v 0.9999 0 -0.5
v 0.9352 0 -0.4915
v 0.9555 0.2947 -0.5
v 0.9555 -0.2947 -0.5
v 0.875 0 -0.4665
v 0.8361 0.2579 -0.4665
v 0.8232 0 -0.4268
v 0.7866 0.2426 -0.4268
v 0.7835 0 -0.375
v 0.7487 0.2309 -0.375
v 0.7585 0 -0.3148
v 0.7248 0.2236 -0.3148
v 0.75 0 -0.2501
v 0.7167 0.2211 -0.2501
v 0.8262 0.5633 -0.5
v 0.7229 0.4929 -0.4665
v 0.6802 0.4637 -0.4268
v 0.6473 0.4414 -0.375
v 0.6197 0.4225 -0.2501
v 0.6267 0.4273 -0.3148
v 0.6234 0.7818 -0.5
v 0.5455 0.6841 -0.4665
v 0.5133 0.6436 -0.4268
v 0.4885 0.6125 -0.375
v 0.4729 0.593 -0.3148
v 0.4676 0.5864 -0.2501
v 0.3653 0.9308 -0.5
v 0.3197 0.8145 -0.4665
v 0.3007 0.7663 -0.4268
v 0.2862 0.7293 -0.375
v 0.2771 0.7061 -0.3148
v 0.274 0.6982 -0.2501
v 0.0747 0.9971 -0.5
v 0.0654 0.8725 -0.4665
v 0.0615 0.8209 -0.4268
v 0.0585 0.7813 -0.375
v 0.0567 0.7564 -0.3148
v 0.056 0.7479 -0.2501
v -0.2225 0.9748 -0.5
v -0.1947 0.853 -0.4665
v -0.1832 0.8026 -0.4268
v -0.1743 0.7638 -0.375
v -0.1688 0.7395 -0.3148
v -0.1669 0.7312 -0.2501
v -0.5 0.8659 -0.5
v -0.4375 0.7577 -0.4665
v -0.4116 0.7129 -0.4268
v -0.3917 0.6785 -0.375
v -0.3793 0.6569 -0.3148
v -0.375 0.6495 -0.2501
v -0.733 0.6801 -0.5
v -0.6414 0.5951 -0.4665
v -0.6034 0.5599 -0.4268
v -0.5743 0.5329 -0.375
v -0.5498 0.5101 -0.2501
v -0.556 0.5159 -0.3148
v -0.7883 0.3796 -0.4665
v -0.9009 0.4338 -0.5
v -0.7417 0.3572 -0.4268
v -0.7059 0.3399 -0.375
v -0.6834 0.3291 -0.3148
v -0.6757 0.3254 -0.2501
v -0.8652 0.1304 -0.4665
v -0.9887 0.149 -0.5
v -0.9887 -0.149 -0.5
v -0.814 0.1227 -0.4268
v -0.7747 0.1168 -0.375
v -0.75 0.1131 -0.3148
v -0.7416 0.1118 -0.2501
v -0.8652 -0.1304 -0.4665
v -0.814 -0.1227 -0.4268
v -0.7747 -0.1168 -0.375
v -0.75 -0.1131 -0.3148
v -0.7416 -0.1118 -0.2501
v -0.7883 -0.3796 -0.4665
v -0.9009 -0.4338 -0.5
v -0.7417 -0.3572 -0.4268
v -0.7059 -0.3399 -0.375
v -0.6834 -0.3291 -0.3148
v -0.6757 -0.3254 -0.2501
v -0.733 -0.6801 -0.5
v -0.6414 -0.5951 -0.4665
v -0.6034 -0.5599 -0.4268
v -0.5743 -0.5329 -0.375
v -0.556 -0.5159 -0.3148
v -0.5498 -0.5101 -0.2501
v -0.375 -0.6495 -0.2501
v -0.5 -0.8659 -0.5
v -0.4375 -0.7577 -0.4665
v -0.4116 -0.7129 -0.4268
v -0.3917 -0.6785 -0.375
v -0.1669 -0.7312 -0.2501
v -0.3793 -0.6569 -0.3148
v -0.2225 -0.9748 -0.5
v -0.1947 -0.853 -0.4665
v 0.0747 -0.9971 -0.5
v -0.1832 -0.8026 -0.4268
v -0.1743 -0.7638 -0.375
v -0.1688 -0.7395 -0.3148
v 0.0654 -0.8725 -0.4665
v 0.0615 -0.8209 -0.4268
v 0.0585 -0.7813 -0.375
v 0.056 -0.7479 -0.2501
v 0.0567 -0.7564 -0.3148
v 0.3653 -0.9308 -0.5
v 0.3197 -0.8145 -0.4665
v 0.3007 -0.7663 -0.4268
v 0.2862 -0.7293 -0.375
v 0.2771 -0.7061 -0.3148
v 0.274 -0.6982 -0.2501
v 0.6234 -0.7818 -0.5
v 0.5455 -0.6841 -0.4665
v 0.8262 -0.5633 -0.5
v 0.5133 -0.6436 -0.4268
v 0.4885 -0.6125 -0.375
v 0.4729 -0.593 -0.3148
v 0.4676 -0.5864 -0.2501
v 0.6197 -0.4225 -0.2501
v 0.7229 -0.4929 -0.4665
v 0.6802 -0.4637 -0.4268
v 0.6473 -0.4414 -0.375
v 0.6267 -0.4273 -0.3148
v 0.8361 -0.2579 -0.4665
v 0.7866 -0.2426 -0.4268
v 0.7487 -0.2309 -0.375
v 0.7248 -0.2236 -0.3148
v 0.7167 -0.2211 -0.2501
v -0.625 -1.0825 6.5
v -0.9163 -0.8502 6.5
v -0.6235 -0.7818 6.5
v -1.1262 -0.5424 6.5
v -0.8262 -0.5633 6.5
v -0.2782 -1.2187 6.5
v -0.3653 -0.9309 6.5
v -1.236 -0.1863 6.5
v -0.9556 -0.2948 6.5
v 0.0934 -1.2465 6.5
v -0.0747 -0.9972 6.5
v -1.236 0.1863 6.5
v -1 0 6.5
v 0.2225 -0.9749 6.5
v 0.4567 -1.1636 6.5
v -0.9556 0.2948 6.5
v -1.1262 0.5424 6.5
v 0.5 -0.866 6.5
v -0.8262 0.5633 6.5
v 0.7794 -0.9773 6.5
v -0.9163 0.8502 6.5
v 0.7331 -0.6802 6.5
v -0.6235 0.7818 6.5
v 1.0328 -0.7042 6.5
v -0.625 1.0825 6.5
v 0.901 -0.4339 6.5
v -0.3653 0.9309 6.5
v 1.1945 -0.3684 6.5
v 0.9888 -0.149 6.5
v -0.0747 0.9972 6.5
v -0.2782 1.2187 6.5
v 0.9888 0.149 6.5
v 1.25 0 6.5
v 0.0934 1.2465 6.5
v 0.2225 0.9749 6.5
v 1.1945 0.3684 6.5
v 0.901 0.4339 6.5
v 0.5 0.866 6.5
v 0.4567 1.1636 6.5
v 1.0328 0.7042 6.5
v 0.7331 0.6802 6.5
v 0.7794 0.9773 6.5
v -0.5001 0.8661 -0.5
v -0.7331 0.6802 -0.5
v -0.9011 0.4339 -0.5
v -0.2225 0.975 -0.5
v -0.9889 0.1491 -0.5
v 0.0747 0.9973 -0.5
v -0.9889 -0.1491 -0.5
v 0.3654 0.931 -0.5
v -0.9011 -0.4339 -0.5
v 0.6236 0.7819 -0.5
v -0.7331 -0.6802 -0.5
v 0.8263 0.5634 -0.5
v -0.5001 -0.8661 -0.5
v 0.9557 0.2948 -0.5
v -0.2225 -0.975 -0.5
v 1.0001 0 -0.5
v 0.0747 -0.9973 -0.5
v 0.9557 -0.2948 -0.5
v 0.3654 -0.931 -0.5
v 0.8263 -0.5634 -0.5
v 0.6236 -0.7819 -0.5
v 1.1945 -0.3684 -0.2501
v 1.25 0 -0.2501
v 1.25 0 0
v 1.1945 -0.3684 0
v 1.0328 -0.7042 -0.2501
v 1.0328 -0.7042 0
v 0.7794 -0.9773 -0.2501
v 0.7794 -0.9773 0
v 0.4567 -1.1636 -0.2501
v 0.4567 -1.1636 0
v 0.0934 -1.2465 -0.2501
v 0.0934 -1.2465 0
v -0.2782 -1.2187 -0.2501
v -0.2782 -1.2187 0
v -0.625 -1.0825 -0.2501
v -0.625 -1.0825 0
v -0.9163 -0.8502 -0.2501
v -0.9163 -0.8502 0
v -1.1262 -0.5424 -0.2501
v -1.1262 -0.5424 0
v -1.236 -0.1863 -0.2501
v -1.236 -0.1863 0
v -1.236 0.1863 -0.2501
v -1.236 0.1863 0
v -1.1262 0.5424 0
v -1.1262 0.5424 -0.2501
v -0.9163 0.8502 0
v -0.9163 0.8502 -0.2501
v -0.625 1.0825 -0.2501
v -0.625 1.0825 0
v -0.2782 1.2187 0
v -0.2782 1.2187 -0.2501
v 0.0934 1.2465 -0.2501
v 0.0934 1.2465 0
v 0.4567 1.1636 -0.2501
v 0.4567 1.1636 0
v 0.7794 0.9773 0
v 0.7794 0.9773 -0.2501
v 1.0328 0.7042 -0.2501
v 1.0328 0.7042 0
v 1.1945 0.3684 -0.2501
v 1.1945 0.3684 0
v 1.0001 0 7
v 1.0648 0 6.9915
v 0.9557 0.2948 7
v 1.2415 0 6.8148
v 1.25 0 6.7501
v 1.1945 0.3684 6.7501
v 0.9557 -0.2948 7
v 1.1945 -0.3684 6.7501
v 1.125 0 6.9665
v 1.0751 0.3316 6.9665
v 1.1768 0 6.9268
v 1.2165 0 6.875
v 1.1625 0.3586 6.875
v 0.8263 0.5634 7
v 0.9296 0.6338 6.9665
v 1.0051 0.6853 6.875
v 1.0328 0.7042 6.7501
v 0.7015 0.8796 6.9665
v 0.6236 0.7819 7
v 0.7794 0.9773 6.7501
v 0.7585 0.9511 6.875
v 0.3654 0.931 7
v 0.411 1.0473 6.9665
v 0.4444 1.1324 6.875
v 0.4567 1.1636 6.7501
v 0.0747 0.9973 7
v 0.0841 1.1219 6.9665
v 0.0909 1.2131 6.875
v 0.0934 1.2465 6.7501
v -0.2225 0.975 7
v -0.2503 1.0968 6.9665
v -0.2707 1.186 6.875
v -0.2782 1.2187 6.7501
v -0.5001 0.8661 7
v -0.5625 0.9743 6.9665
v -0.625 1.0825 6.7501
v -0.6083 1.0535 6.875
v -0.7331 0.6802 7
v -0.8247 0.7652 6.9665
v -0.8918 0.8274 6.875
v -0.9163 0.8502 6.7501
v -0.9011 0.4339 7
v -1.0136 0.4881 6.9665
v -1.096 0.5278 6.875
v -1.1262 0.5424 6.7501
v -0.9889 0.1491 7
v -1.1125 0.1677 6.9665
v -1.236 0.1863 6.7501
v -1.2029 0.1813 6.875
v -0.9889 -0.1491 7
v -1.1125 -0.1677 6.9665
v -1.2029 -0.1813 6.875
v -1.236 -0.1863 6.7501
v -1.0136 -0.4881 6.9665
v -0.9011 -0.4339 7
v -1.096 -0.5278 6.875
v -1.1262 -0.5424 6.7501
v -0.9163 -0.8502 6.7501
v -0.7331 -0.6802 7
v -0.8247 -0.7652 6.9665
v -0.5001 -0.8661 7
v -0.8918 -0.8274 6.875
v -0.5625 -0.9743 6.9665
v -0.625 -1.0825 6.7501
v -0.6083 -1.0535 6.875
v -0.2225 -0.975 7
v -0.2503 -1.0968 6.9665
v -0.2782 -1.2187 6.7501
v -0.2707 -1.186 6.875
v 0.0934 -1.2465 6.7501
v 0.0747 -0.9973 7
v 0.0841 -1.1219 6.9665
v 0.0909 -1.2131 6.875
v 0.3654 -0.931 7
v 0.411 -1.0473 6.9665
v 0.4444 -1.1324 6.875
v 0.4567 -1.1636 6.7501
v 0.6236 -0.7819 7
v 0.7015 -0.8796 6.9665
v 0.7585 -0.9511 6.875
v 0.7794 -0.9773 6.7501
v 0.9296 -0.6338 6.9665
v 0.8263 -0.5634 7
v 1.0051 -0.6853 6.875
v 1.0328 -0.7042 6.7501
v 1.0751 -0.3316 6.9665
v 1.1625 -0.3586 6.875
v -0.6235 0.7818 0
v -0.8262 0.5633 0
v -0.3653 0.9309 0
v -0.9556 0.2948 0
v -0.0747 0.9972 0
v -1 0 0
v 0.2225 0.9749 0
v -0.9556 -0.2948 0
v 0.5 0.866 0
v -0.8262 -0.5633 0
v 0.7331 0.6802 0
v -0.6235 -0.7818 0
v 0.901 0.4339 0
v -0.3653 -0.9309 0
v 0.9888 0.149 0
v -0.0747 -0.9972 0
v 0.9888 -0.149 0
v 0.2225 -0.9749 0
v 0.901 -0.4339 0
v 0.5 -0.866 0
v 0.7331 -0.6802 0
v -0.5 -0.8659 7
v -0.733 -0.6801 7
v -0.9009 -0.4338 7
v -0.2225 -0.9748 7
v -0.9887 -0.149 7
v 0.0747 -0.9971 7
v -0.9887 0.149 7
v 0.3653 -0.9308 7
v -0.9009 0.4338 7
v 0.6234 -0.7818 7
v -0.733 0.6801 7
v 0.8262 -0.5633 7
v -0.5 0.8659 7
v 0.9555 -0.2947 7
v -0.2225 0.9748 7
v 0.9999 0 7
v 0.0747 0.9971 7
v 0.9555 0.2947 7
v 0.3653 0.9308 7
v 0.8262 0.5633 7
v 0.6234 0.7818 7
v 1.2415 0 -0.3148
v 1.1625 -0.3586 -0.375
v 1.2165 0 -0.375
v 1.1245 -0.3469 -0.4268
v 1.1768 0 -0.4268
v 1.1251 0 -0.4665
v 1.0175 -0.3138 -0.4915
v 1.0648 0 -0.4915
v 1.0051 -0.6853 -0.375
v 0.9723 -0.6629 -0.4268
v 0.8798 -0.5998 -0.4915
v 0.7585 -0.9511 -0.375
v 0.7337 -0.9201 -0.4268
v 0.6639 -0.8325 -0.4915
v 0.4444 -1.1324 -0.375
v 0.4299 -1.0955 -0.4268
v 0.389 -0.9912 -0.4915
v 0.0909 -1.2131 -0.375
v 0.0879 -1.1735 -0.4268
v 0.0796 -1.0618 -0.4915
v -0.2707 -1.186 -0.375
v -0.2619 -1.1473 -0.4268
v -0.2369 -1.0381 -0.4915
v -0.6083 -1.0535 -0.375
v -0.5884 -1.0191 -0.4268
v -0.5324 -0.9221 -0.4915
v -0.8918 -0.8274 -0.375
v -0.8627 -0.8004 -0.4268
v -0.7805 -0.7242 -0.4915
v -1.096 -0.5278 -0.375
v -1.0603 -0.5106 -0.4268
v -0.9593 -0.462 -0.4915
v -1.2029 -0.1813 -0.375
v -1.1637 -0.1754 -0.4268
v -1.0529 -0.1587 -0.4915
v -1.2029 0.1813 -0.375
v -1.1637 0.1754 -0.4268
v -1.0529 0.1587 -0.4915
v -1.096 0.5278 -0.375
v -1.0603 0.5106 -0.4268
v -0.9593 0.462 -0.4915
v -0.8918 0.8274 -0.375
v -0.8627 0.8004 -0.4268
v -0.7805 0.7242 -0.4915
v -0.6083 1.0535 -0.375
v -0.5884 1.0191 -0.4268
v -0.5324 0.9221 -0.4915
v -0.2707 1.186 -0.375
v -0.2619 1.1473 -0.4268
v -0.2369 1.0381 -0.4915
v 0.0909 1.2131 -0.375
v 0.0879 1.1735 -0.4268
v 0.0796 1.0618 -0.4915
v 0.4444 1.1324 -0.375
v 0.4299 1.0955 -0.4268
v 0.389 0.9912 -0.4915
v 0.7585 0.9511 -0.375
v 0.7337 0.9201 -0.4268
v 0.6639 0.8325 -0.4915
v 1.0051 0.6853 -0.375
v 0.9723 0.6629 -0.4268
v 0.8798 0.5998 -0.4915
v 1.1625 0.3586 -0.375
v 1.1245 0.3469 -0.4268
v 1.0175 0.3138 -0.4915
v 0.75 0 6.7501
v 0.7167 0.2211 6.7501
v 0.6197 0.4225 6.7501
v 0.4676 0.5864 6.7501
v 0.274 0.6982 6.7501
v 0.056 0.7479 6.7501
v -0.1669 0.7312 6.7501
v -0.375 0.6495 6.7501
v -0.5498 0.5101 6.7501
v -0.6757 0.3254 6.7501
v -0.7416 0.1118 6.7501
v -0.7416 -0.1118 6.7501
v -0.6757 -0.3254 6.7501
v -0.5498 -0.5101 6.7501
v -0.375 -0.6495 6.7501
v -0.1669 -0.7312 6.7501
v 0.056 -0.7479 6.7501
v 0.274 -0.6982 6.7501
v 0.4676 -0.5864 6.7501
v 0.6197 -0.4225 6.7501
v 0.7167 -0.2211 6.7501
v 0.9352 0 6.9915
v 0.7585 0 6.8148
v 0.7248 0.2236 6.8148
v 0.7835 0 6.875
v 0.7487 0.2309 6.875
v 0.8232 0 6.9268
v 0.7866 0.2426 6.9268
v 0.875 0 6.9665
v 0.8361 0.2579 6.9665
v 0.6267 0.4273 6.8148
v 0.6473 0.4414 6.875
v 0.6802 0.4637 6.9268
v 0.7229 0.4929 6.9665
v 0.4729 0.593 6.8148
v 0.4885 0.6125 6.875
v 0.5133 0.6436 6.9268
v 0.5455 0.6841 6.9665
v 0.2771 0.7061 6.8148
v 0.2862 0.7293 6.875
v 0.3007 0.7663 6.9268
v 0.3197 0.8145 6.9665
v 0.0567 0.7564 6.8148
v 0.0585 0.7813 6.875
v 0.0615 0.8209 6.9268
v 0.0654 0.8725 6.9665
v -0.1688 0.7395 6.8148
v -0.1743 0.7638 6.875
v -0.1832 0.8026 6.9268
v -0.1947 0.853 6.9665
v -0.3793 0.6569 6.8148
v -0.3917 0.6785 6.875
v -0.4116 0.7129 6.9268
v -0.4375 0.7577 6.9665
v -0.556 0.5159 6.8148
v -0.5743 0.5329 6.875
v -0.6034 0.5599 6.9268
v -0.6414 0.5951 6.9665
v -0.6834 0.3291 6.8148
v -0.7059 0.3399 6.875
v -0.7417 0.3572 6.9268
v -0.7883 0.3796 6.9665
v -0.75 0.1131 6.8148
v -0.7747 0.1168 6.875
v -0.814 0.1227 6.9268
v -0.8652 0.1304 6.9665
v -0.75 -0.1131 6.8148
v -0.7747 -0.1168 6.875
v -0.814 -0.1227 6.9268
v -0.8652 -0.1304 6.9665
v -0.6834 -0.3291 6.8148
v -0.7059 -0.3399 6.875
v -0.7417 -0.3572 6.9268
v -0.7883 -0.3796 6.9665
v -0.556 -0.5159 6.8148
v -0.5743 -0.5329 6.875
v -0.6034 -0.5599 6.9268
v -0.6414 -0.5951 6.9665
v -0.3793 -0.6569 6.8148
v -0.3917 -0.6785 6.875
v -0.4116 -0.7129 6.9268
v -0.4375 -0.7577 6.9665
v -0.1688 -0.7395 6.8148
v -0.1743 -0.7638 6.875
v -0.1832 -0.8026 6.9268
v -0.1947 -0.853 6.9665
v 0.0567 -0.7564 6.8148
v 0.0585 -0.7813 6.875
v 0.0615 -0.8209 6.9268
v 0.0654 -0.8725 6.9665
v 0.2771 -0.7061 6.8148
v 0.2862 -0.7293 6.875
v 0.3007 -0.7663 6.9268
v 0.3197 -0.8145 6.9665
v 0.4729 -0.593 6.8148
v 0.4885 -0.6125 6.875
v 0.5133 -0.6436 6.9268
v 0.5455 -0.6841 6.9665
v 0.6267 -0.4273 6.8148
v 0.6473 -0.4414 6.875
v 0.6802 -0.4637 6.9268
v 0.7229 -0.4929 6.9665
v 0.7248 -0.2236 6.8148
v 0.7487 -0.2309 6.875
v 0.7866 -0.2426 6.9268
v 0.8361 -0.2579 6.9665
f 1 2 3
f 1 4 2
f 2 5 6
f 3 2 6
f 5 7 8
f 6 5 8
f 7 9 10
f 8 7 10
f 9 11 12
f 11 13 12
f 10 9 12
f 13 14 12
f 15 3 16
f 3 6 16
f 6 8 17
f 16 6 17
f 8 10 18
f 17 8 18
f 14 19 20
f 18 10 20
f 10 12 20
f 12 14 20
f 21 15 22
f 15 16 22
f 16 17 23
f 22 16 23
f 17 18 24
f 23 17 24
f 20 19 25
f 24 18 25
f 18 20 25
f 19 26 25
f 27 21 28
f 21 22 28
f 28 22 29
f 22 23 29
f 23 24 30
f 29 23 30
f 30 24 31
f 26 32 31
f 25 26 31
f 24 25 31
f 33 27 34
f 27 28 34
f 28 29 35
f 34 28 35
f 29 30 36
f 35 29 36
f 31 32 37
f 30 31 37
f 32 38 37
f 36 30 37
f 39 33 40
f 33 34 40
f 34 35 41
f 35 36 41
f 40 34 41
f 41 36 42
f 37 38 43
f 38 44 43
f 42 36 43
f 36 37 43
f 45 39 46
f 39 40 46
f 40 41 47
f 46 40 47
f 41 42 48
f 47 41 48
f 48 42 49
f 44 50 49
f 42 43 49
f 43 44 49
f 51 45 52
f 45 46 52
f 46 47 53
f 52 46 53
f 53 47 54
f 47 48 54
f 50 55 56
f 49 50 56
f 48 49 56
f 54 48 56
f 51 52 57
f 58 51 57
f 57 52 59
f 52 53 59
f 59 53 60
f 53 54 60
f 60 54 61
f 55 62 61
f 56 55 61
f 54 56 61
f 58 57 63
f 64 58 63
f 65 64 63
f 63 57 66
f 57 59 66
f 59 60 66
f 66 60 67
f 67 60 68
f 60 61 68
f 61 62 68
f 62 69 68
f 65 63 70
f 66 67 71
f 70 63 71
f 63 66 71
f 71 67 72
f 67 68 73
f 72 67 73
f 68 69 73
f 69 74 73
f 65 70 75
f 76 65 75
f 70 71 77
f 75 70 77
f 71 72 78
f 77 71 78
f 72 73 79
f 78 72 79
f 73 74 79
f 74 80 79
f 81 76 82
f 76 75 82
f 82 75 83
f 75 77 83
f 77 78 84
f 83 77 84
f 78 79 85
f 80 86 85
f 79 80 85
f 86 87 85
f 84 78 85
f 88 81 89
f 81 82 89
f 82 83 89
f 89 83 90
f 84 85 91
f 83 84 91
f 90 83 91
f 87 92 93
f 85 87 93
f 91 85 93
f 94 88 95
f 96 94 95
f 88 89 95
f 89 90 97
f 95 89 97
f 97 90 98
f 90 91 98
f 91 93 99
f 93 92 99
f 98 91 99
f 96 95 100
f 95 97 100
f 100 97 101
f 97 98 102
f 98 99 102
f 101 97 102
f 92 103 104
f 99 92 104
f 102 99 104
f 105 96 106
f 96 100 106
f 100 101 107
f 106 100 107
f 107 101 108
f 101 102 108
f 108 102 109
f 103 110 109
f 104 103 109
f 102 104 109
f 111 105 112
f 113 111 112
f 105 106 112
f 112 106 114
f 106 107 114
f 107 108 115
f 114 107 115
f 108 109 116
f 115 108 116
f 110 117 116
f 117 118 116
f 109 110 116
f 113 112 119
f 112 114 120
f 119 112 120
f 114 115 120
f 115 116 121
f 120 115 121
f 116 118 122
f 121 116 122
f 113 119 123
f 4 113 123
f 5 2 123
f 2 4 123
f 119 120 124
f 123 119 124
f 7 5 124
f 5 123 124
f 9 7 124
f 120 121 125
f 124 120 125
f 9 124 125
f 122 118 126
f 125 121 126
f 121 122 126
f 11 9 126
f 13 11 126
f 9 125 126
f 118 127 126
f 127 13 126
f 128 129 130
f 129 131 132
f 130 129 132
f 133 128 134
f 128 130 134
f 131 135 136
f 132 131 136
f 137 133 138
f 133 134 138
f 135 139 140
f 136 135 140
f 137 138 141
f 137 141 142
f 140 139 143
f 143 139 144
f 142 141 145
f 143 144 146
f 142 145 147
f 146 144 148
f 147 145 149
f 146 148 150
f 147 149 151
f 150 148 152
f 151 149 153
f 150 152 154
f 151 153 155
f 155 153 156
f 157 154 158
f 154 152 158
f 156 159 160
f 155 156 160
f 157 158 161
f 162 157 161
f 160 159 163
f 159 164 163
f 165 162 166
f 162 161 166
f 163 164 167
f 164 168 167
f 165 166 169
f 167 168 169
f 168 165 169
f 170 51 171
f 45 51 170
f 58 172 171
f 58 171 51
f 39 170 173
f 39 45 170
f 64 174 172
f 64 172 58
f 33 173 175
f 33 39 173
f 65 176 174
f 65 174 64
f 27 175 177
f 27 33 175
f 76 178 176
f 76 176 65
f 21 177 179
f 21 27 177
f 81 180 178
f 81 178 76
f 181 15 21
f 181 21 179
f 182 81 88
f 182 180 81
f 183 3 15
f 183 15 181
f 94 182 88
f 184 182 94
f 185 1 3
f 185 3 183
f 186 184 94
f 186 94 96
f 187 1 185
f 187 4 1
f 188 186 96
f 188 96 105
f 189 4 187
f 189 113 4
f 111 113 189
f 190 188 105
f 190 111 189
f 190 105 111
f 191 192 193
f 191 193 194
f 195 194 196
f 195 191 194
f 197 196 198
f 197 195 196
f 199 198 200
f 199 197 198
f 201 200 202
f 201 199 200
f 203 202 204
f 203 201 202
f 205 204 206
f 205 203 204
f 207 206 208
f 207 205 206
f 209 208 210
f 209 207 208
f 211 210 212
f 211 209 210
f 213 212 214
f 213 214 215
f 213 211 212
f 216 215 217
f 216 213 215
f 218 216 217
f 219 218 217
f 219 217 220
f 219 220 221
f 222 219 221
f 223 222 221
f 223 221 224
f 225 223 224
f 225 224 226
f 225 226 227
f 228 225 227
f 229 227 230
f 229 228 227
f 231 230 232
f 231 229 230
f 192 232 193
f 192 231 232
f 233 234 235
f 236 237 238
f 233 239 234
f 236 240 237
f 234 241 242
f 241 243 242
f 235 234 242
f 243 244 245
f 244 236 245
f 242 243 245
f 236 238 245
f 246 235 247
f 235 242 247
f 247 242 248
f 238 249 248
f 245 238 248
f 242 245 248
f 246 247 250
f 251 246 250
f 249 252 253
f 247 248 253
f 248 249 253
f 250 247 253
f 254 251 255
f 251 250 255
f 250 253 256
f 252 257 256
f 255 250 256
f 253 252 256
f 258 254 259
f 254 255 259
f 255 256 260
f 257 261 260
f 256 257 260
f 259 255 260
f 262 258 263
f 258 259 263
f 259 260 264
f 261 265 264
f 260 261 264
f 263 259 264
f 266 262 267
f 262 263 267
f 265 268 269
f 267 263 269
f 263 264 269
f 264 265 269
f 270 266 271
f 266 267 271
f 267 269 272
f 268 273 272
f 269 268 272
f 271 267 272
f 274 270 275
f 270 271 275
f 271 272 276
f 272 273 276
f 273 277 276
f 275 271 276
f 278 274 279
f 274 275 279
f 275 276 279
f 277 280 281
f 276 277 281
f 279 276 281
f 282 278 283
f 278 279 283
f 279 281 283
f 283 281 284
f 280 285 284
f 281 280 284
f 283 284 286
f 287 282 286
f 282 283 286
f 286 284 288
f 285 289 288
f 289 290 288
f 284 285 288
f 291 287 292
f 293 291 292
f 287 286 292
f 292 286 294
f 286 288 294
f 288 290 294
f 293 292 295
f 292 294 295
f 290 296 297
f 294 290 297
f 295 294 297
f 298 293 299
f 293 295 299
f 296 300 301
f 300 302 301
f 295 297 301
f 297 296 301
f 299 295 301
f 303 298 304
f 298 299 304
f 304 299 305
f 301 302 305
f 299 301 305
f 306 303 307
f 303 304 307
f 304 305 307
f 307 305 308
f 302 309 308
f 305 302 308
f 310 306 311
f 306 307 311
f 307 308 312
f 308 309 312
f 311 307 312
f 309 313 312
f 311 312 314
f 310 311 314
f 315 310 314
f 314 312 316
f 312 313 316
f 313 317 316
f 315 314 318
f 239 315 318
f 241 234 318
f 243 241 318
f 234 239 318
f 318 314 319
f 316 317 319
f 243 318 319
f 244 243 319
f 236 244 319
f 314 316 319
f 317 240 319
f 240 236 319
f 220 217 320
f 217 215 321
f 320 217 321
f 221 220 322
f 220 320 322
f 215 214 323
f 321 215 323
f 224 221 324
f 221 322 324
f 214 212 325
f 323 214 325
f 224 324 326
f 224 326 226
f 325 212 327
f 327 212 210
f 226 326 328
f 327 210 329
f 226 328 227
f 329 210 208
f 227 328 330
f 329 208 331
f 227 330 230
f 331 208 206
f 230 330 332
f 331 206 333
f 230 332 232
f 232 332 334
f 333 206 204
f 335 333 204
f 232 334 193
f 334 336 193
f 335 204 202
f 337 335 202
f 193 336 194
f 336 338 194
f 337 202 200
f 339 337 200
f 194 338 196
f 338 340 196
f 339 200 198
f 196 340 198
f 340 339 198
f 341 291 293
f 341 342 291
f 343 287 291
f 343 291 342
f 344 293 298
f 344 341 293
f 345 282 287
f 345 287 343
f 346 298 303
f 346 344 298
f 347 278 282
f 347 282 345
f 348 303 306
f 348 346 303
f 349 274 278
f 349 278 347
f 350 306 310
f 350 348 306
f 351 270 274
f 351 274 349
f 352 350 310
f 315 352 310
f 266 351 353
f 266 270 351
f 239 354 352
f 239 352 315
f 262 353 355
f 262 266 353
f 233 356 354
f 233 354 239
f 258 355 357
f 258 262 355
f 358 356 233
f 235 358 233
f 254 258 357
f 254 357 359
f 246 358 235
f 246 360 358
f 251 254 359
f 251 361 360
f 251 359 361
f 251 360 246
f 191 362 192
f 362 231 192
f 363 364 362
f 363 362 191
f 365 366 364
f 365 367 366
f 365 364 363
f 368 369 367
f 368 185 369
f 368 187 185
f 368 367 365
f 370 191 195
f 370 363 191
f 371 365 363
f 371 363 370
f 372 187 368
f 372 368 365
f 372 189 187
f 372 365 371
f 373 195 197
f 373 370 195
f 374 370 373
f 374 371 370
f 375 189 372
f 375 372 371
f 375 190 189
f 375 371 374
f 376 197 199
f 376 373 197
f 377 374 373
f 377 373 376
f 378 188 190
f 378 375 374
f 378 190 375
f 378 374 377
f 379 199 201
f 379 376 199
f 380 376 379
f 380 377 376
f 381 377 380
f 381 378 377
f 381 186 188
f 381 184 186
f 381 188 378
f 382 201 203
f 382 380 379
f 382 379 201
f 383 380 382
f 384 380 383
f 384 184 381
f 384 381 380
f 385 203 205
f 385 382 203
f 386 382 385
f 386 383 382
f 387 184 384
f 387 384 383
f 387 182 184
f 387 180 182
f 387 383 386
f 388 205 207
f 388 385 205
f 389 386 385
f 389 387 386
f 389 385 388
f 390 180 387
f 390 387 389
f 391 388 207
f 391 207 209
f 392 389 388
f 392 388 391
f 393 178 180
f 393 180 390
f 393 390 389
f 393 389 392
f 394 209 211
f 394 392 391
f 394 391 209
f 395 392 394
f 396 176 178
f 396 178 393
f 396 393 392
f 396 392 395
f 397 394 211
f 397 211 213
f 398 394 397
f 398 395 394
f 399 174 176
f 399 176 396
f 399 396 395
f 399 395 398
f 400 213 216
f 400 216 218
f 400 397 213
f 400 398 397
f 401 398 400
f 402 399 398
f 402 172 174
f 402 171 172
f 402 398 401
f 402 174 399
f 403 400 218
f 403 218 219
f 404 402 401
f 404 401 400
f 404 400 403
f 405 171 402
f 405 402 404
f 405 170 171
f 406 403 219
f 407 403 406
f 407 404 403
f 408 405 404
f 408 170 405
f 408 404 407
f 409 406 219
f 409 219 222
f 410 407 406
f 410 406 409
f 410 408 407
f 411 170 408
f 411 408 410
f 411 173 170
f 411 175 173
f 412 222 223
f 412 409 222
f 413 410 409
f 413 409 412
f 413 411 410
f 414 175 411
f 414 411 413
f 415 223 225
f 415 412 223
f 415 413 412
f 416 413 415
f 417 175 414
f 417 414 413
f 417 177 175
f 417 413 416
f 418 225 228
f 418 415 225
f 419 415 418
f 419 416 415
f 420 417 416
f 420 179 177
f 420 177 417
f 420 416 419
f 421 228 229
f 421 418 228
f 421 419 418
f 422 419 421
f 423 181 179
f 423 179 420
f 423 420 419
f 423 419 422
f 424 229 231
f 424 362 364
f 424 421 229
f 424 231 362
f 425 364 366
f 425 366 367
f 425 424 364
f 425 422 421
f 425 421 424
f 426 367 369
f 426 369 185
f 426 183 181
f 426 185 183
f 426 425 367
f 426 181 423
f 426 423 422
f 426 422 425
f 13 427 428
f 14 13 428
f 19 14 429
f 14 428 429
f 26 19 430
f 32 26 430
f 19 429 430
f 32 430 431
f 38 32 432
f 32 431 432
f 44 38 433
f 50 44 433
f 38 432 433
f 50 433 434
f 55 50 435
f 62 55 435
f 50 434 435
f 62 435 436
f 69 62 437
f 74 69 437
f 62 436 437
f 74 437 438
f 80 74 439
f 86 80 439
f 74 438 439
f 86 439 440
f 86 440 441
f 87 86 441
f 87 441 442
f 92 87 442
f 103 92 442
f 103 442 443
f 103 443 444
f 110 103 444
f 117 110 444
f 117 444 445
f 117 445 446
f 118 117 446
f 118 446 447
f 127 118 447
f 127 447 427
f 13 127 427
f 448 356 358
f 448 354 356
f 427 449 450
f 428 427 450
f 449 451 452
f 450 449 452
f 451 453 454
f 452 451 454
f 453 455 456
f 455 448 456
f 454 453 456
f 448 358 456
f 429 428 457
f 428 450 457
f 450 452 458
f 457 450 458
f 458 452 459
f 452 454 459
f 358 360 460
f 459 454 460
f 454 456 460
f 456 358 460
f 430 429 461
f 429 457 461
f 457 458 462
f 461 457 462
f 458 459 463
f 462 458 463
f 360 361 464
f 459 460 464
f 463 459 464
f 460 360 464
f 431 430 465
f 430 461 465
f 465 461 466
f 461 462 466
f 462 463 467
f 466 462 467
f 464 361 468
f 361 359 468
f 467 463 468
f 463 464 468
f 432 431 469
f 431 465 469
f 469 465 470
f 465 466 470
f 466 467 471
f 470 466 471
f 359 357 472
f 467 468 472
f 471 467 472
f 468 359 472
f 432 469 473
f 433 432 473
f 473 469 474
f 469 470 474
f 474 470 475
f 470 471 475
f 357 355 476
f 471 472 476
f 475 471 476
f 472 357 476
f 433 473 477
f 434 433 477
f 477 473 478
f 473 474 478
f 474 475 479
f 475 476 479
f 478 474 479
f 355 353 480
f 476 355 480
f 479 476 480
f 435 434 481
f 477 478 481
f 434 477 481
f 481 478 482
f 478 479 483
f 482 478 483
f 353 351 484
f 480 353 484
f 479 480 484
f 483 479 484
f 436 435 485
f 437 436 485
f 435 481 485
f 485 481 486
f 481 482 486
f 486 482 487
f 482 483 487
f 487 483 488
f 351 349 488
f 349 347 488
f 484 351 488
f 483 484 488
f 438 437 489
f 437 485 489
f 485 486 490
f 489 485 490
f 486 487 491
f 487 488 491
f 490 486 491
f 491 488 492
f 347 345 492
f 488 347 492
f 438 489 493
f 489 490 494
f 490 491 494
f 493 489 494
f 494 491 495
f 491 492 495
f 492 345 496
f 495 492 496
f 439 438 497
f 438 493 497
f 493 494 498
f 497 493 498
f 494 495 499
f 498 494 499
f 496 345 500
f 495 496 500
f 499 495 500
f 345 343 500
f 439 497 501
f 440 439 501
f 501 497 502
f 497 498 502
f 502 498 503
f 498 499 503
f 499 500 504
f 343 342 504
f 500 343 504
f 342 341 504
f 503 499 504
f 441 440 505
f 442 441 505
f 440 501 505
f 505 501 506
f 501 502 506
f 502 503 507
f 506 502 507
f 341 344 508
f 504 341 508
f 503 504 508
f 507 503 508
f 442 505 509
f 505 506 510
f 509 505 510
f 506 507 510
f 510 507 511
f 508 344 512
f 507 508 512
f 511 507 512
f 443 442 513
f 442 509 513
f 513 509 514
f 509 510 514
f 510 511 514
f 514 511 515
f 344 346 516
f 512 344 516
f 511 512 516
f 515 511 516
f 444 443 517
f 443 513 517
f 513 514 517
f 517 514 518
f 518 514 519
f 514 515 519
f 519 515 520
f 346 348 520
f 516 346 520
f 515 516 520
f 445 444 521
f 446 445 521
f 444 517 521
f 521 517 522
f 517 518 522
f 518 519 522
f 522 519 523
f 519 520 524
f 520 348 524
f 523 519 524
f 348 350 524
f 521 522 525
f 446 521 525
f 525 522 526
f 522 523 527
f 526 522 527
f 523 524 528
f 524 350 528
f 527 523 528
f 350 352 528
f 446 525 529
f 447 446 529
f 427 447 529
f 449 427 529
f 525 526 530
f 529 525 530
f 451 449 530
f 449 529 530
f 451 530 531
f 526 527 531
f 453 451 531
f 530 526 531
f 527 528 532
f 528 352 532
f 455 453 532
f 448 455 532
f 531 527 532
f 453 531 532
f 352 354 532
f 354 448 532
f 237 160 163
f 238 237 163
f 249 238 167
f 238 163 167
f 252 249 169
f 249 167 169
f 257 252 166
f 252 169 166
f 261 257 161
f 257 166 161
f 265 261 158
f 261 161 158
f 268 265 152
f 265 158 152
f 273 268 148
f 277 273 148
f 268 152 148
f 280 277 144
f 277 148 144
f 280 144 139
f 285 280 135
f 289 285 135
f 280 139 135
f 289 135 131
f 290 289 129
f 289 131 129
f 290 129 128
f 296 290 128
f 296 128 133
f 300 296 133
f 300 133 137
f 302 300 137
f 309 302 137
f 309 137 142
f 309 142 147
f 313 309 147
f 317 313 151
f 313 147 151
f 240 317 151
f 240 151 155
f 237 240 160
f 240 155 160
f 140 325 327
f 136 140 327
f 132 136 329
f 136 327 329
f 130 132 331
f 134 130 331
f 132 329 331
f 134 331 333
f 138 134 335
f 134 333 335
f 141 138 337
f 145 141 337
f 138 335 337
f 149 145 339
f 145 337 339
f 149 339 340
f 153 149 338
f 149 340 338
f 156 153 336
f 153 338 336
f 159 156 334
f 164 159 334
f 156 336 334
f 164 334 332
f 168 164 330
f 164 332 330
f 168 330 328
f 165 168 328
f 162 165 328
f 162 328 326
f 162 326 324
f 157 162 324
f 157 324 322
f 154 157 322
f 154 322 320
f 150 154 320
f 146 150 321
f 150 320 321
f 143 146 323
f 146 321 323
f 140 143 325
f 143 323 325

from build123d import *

# Parameters (mm, degrees)
SKETCH1_R           = 1
BOSS_EXTRUDE1_DEPTH = 6.5
SKETCH2_R           = 1.25
BOSS_EXTRUDE2_DEPTH = 0.5
BOSS_EXTRUDE3_START = 0.5
SKETCH3_R           = 1.25
BOSS_EXTRUDE3_DEPTH = 0.5
SKETCH4_R           = 0.75
CUT_EXTRUDE1_DEPTH  = 10.5
FILLET1_R           = 0.25


with BuildPart() as part:
    # Sketch1 → Boss-Extrude1 (new body)
    with BuildSketch(Plane.XY):
        with Locations(Location((0, 0, 0), (0, 0, 180))):
            Circle(SKETCH1_R)
    extrude(amount=BOSS_EXTRUDE1_DEPTH)

    # Sketch2 → Boss-Extrude2 (add)
    with BuildSketch(Plane.XY.offset(6.5)):
        Circle(SKETCH2_R)
    extrude(amount=BOSS_EXTRUDE2_DEPTH)

    # Sketch3 → Boss-Extrude3 (add)
    with BuildSketch(Plane(origin=(0, 0, 0), x_dir=(-1, 0, 0), z_dir=(0, 0, -1)).offset(BOSS_EXTRUDE3_START)):
        with Locations(Location((0, 0, 0), (0, 0, 180))):
            Circle(SKETCH3_R)
    extrude(amount=-BOSS_EXTRUDE3_DEPTH)

    # Sketch4 → Cut-Extrude1 (cut)
    with BuildSketch(Plane.XY.offset(7)):
        Circle(SKETCH4_R)
    extrude(amount=-CUT_EXTRUDE1_DEPTH, mode=Mode.SUBTRACT)

    # Fillet1
    fillet1_edges = [part.edges().sort_by_distance(p)[0] for p in [
        (-1.25, 0, -0.5),
        (-0.75, 0, -0.5),
        (-0.75, 0, 7),
        (-1.25, 0, 7),
    ]]
    fillet(fillet1_edges, radius=FILLET1_R - 0.0001)  # a hair under: the kernel refuses the full size


solid = part.part
